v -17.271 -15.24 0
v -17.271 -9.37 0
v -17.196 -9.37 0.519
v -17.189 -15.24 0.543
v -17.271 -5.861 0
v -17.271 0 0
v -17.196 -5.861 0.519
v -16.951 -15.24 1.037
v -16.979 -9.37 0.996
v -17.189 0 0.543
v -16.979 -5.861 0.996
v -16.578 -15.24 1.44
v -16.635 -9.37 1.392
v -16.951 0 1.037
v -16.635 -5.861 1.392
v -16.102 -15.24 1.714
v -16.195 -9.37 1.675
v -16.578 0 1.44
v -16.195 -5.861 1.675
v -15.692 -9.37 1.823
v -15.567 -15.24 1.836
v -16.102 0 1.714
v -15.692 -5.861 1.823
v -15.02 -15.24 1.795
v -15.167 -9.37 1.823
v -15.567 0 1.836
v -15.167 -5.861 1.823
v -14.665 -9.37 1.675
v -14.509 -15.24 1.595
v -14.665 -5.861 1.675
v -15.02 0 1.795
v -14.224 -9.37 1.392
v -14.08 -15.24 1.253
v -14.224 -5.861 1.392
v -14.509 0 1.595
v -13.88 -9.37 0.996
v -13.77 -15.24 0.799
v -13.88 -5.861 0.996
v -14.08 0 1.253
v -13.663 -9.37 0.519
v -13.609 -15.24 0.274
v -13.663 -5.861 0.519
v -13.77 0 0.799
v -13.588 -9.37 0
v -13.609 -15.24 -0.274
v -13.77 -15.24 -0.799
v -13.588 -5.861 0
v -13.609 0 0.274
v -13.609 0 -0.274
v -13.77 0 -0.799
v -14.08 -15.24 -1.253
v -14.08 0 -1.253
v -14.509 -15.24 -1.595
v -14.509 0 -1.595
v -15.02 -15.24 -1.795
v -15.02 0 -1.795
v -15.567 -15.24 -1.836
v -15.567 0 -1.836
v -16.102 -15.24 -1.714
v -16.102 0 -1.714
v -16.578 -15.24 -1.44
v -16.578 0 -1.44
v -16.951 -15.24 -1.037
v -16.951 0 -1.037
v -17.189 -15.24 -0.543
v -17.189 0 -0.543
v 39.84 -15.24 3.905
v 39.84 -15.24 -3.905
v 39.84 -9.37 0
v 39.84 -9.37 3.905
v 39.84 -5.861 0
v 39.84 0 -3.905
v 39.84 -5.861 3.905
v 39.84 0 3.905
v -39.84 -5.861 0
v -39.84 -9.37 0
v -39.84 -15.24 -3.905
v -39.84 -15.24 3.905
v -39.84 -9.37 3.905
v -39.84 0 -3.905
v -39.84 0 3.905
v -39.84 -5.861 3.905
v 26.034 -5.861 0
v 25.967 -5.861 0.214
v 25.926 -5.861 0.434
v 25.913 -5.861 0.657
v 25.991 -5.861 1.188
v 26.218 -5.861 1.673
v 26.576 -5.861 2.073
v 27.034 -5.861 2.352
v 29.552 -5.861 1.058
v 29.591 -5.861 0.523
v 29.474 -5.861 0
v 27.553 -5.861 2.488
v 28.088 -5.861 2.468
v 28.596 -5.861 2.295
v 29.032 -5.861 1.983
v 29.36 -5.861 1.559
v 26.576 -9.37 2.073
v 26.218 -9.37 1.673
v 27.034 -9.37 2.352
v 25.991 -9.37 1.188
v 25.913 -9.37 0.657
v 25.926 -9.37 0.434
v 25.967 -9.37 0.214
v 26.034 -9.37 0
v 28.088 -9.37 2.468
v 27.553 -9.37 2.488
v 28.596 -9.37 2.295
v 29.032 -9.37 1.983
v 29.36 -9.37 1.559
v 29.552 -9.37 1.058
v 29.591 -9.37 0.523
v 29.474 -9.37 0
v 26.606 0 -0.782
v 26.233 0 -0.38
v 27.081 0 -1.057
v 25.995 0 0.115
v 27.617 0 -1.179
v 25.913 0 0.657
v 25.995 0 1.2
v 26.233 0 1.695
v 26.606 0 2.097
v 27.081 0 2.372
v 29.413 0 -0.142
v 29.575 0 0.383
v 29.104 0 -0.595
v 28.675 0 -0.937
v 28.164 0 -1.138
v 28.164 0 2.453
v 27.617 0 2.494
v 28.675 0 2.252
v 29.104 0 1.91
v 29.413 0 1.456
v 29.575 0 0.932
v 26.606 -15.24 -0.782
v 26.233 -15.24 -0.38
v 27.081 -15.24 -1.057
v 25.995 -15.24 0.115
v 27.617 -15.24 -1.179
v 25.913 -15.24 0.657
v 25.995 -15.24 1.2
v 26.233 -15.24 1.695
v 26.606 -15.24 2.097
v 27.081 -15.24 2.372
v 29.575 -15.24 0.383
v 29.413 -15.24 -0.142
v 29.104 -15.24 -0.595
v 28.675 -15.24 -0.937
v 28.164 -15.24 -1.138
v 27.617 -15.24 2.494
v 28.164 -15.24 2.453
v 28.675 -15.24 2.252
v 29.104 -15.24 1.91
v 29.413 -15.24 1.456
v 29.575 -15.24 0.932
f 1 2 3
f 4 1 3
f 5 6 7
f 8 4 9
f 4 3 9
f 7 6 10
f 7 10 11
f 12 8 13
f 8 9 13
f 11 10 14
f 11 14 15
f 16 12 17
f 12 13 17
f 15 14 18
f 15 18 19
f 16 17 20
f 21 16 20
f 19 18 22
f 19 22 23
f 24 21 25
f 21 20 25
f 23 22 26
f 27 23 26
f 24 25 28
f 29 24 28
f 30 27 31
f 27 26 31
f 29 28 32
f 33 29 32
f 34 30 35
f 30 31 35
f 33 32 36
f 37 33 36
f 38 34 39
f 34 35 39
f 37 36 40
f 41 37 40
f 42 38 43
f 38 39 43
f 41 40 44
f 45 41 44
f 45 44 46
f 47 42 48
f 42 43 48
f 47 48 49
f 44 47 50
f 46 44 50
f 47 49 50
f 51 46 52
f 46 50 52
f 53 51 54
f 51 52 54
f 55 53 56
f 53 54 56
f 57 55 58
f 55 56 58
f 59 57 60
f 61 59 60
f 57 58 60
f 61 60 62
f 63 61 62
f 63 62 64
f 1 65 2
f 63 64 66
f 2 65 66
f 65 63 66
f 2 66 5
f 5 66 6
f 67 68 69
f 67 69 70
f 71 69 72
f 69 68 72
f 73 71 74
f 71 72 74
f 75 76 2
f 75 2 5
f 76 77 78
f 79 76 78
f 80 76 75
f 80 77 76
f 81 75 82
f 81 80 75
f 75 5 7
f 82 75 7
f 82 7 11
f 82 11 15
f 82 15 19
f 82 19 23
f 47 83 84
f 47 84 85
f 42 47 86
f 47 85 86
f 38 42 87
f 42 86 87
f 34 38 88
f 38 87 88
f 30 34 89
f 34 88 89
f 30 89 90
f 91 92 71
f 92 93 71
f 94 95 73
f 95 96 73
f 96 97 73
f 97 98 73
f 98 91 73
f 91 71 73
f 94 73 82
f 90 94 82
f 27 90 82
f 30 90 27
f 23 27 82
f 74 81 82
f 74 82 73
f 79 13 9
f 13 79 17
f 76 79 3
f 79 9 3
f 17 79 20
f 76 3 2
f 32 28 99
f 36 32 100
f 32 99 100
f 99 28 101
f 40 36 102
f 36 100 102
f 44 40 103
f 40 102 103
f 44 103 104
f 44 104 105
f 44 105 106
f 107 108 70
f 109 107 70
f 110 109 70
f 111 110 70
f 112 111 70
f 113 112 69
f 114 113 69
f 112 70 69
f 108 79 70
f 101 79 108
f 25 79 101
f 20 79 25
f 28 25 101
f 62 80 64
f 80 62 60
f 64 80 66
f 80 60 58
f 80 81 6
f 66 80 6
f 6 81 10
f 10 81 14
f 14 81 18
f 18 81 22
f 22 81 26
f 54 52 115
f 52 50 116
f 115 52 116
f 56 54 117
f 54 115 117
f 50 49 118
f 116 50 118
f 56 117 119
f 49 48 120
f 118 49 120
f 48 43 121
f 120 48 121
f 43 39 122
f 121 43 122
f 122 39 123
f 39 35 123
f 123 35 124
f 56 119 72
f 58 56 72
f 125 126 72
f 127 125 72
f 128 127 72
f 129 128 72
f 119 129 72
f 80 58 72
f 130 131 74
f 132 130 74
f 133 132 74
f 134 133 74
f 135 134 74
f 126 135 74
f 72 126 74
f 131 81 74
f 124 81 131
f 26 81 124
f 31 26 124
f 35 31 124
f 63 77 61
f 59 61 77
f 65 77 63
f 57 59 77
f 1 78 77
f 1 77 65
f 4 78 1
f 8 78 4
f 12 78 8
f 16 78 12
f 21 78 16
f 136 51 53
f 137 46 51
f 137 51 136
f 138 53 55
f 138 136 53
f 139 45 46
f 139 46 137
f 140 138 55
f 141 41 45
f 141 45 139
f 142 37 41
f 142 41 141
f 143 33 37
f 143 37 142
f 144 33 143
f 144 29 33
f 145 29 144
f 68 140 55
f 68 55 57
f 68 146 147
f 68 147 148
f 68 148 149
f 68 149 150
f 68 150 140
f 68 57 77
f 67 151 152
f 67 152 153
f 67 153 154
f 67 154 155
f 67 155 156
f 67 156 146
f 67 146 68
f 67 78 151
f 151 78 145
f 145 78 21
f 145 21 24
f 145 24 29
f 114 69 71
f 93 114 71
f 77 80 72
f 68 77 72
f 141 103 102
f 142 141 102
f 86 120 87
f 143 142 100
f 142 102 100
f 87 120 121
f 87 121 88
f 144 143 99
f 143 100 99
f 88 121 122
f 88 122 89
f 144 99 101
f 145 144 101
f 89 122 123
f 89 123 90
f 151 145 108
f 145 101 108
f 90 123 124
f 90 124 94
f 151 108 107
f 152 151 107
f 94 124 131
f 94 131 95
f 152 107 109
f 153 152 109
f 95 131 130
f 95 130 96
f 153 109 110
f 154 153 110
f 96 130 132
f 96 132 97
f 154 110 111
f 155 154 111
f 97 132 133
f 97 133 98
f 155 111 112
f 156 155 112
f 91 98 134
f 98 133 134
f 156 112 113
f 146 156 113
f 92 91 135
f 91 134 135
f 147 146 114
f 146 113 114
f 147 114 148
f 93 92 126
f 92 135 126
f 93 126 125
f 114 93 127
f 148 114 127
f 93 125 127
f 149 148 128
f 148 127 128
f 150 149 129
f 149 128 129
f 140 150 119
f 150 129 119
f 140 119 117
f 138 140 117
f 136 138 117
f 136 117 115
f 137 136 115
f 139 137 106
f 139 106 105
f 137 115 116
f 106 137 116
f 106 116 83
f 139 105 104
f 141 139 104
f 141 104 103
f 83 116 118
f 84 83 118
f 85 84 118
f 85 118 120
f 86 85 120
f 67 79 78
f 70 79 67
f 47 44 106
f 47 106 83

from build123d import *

# Parameters (mm, degrees)
F0_W     = 79.679102
F0_H     = 7.809082
F1_DEPTH = 15.24
F2_W     = 3.50939
F2_H     = 3.868172
F3_DEPTH = 63.5
F4_R     = 1.8415
F5_DEPTH = 32.7406


with BuildPart() as f1:
    # F0 (on Front) → F1 (new body)
    with BuildSketch(Plane.XZ):
        Rectangle(F0_W, F0_H)
    extrude(amount=F1_DEPTH)

    # F2 (on Right) → F3 (cut, symmetric)
    with BuildSketch(Plane.YZ):
        with Locations((-7.615543, 5.802258)):
            Rectangle(F2_W, F2_H)
        with Locations((-7.615543, 1.934086)):
            Rectangle(F2_W, F2_H)
    extrude(amount=F3_DEPTH, both=True, mode=Mode.SUBTRACT)

    # F4 (on face) → F5 (cut)
    with BuildSketch(Plane(origin=(0, 0, 0), x_dir=(-1, 0, 0), z_dir=(0, 1, 0))):
        with Locations((-27.754245, 0.657367)):
            Circle(F4_R)
        with Locations((15.429531, 0)):
            Circle(F4_R)
    extrude(amount=-F5_DEPTH, mode=Mode.SUBTRACT)


solid = f1.part
